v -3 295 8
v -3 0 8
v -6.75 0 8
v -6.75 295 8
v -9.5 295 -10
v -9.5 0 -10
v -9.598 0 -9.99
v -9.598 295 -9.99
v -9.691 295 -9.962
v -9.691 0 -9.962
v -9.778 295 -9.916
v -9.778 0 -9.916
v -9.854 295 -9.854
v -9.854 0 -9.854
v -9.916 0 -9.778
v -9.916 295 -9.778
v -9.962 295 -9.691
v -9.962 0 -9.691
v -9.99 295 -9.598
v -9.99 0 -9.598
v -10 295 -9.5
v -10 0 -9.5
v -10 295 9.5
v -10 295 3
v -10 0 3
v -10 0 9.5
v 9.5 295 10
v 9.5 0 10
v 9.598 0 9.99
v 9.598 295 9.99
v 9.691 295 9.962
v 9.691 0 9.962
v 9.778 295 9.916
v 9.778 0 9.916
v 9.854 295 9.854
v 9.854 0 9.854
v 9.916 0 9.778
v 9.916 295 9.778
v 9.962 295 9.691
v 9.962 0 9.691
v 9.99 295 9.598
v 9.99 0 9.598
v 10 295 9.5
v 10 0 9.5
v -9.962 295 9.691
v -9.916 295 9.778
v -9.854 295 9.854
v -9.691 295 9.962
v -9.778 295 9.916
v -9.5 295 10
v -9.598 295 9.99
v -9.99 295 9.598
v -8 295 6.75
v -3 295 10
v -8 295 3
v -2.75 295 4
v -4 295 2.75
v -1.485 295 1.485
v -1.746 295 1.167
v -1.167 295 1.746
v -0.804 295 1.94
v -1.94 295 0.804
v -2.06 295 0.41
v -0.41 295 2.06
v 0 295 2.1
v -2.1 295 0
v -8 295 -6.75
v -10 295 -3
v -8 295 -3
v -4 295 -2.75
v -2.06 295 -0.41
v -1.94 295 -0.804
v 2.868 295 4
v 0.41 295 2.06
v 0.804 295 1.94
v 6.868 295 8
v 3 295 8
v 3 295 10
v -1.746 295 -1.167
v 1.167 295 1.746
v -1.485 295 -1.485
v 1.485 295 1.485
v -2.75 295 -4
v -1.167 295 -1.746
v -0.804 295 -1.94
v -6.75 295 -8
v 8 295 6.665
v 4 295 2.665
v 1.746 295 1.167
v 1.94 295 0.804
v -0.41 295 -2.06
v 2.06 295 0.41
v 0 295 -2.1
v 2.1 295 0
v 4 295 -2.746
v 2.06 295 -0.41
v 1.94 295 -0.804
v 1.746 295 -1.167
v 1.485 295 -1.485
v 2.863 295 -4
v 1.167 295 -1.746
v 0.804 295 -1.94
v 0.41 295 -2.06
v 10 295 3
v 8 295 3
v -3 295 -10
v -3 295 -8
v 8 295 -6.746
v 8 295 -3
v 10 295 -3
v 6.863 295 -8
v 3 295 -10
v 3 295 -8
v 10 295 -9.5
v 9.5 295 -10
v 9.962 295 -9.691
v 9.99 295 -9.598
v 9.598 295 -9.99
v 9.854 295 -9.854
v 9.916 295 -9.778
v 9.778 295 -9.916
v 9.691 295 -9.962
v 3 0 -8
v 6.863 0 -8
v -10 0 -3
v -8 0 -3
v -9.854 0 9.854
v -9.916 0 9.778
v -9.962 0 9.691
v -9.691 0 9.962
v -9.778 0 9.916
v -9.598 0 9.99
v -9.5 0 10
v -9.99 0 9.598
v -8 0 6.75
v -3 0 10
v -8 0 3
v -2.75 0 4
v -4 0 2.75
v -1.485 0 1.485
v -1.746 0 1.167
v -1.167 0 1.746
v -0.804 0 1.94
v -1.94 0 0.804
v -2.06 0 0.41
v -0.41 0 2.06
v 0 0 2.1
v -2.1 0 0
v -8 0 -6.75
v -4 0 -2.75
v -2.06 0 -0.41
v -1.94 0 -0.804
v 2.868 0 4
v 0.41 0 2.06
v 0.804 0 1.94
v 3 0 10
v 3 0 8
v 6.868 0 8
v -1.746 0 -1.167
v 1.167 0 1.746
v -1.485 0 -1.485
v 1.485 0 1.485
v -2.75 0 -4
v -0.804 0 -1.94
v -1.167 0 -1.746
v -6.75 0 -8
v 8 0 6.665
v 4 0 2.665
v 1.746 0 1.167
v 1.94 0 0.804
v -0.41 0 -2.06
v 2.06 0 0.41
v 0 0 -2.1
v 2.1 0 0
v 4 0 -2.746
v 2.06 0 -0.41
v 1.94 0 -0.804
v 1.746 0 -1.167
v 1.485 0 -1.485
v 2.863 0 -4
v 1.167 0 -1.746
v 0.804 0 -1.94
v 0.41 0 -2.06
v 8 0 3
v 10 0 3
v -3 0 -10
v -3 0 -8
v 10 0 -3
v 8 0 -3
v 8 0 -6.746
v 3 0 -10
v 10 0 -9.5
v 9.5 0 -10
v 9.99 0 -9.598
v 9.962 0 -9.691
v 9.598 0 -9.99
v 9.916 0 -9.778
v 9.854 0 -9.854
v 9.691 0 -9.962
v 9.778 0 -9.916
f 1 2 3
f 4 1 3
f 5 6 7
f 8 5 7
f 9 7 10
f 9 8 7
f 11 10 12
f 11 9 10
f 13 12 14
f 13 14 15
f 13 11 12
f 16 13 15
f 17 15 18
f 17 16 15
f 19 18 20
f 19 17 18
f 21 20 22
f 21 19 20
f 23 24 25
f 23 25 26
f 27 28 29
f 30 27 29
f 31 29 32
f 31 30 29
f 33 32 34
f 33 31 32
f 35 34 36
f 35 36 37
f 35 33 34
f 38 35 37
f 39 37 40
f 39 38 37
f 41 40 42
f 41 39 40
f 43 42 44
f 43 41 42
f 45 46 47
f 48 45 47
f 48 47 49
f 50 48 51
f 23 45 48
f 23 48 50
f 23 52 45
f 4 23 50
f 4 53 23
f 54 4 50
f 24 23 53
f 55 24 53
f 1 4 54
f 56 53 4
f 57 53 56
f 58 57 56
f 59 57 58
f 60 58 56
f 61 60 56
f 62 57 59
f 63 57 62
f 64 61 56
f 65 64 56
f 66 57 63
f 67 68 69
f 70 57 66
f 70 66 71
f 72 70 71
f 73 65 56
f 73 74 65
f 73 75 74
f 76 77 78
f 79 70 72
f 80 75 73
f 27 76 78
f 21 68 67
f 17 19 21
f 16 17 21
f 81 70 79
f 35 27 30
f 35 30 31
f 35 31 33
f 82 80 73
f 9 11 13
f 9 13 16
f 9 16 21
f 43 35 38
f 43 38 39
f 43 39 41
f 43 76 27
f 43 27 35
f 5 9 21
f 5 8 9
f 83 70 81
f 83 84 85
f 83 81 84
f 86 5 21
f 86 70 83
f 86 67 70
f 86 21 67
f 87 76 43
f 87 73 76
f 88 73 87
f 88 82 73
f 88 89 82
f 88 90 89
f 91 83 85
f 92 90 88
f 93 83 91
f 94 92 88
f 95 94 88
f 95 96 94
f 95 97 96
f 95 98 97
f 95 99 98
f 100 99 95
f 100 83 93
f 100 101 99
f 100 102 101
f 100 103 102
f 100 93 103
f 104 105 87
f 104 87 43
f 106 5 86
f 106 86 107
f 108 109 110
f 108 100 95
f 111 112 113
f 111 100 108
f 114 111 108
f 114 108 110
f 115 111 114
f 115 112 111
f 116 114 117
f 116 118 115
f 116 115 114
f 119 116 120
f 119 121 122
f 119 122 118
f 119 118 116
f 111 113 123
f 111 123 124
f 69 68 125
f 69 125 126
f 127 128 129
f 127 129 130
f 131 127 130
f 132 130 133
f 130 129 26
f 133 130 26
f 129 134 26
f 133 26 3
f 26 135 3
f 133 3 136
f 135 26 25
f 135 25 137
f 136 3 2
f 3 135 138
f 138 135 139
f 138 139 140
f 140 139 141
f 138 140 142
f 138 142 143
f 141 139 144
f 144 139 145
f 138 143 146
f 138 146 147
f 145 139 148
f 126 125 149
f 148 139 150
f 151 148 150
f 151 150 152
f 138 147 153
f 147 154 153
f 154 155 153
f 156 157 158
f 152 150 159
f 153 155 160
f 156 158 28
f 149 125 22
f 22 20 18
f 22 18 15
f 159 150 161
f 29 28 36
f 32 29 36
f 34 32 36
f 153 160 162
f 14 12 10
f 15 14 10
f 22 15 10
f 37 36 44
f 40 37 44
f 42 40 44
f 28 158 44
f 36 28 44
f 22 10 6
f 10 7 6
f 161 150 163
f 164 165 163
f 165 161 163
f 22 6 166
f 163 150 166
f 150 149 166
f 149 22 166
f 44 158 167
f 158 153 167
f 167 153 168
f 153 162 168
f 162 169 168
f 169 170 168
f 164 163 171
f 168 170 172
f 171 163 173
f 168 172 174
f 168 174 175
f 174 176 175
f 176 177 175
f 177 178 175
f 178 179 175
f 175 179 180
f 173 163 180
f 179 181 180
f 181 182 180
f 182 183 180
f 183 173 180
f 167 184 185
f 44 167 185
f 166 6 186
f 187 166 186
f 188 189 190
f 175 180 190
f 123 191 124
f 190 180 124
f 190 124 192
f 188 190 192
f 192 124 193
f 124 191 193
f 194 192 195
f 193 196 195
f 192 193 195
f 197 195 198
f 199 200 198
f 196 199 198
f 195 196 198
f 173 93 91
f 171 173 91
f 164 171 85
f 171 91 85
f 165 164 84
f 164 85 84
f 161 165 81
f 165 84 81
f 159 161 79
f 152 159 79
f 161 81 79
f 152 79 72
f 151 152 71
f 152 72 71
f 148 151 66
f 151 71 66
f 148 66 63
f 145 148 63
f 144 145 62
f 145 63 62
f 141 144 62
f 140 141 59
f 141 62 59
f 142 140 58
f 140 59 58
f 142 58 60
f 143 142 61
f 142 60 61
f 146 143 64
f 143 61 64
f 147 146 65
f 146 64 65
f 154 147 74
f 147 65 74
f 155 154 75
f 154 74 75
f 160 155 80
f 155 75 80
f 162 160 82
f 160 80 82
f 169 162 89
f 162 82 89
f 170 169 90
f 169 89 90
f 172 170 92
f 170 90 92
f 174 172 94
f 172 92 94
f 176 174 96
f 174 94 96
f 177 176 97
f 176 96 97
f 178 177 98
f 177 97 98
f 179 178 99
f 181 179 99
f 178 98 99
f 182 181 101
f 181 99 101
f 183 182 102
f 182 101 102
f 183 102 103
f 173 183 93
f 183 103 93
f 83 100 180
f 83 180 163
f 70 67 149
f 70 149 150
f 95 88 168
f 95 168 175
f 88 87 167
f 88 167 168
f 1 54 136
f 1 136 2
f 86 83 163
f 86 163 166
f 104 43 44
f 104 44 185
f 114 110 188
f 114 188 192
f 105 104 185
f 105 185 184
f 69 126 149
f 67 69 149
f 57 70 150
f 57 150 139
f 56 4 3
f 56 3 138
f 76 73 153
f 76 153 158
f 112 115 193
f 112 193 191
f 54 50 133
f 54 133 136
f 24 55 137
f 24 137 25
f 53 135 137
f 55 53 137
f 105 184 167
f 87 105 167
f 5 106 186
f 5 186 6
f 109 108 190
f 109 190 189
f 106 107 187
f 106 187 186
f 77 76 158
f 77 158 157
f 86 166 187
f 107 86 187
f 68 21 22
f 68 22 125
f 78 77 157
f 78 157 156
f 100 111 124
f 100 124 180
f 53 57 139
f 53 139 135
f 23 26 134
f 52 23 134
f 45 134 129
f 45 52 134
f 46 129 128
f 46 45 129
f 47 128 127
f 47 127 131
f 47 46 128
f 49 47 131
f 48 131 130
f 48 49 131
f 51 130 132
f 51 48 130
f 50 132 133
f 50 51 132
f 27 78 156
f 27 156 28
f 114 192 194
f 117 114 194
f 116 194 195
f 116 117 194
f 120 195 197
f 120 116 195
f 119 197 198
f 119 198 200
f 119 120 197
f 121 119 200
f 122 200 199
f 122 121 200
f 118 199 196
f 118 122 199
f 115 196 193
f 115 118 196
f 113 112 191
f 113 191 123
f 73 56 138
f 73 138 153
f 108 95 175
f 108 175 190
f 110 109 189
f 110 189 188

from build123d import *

# Parameters (mm, degrees)
SKETCH1_R           = 2.1
BOSS_EXTRUDE1_DEPTH = 295


with BuildPart() as part:
    # Sketch1 → Boss-Extrude1 (new body)
    with BuildSketch(Plane(origin=(0, 295, 0), x_dir=(1, 0, 0), z_dir=(0, 1, 0))):
        with BuildLine():
            Line((4, 2.746364236), (8, 6.746364236))
            Line((8, 6.746364236), (8, 3))
            Line((8, 3), (10, 3))
            Line((10, 3), (10, 9.5))
            ThreePointArc((10, 9.5), (9.853553391, 9.853553391), (9.5, 10))
            Line((9.5, 10), (3, 10))
            Line((3, 10), (3, 8))
            Line((3, 8), (6.863334179, 8))
            Line((6.863334179, 8), (2.863334179, 4))
            Line((2.863334179, 4), (-2.75, 4))
            Line((-2.75, 4), (-6.75, 8))
            Line((-6.75, 8), (-3, 8))
            Line((-3, 8), (-3, 10))
            Line((-3, 10), (-9.5, 10))
            ThreePointArc((-9.5, 10), (-9.853553391, 9.853553391), (-10, 9.5))
            Line((-10, 9.5), (-10, 3))
            Line((-10, 3), (-8, 3))
            Line((-8, 3), (-8, 6.75))
            Line((-8, 6.75), (-4, 2.75))
            Line((-4, 2.75), (-4, -2.75))
            Line((-4, -2.75), (-8, -6.75))
            Line((-8, -6.75), (-8, -3))
            Line((-8, -3), (-10, -3))
            Line((-10, -3), (-10, -9.5))
            ThreePointArc((-10, -9.5), (-9.853553391, -9.853553391), (-9.5, -10))
            Line((-9.5, -10), (-3, -10))
            Line((-3, -10), (-3, -8))
            Line((-3, -8), (-6.75, -8))
            Line((-6.75, -8), (-2.75, -4))
            Line((-2.75, -4), (2.868469119, -4))
            Line((2.868469119, -4), (6.868469119, -8))
            Line((6.868469119, -8), (3, -8))
            Line((3, -8), (3, -10))
            Line((3, -10), (9.5, -10))
            ThreePointArc((9.5, -10), (9.853553391, -9.853553391), (10, -9.5))
            Line((10, -9.5), (10, -3))
            Line((10, -3), (8, -3))
            Line((8, -3), (8, -6.665189266))
            Line((8, -6.665189266), (4, -2.665189266))
            Line((4, -2.665189266), (4, 2.746364236))
        make_face()
        with Locations(Location((0, 0, 0), (0, 0, 90))):
            Circle(SKETCH1_R, mode=Mode.SUBTRACT)
    extrude(amount=-BOSS_EXTRUDE1_DEPTH)


solid = part.part
